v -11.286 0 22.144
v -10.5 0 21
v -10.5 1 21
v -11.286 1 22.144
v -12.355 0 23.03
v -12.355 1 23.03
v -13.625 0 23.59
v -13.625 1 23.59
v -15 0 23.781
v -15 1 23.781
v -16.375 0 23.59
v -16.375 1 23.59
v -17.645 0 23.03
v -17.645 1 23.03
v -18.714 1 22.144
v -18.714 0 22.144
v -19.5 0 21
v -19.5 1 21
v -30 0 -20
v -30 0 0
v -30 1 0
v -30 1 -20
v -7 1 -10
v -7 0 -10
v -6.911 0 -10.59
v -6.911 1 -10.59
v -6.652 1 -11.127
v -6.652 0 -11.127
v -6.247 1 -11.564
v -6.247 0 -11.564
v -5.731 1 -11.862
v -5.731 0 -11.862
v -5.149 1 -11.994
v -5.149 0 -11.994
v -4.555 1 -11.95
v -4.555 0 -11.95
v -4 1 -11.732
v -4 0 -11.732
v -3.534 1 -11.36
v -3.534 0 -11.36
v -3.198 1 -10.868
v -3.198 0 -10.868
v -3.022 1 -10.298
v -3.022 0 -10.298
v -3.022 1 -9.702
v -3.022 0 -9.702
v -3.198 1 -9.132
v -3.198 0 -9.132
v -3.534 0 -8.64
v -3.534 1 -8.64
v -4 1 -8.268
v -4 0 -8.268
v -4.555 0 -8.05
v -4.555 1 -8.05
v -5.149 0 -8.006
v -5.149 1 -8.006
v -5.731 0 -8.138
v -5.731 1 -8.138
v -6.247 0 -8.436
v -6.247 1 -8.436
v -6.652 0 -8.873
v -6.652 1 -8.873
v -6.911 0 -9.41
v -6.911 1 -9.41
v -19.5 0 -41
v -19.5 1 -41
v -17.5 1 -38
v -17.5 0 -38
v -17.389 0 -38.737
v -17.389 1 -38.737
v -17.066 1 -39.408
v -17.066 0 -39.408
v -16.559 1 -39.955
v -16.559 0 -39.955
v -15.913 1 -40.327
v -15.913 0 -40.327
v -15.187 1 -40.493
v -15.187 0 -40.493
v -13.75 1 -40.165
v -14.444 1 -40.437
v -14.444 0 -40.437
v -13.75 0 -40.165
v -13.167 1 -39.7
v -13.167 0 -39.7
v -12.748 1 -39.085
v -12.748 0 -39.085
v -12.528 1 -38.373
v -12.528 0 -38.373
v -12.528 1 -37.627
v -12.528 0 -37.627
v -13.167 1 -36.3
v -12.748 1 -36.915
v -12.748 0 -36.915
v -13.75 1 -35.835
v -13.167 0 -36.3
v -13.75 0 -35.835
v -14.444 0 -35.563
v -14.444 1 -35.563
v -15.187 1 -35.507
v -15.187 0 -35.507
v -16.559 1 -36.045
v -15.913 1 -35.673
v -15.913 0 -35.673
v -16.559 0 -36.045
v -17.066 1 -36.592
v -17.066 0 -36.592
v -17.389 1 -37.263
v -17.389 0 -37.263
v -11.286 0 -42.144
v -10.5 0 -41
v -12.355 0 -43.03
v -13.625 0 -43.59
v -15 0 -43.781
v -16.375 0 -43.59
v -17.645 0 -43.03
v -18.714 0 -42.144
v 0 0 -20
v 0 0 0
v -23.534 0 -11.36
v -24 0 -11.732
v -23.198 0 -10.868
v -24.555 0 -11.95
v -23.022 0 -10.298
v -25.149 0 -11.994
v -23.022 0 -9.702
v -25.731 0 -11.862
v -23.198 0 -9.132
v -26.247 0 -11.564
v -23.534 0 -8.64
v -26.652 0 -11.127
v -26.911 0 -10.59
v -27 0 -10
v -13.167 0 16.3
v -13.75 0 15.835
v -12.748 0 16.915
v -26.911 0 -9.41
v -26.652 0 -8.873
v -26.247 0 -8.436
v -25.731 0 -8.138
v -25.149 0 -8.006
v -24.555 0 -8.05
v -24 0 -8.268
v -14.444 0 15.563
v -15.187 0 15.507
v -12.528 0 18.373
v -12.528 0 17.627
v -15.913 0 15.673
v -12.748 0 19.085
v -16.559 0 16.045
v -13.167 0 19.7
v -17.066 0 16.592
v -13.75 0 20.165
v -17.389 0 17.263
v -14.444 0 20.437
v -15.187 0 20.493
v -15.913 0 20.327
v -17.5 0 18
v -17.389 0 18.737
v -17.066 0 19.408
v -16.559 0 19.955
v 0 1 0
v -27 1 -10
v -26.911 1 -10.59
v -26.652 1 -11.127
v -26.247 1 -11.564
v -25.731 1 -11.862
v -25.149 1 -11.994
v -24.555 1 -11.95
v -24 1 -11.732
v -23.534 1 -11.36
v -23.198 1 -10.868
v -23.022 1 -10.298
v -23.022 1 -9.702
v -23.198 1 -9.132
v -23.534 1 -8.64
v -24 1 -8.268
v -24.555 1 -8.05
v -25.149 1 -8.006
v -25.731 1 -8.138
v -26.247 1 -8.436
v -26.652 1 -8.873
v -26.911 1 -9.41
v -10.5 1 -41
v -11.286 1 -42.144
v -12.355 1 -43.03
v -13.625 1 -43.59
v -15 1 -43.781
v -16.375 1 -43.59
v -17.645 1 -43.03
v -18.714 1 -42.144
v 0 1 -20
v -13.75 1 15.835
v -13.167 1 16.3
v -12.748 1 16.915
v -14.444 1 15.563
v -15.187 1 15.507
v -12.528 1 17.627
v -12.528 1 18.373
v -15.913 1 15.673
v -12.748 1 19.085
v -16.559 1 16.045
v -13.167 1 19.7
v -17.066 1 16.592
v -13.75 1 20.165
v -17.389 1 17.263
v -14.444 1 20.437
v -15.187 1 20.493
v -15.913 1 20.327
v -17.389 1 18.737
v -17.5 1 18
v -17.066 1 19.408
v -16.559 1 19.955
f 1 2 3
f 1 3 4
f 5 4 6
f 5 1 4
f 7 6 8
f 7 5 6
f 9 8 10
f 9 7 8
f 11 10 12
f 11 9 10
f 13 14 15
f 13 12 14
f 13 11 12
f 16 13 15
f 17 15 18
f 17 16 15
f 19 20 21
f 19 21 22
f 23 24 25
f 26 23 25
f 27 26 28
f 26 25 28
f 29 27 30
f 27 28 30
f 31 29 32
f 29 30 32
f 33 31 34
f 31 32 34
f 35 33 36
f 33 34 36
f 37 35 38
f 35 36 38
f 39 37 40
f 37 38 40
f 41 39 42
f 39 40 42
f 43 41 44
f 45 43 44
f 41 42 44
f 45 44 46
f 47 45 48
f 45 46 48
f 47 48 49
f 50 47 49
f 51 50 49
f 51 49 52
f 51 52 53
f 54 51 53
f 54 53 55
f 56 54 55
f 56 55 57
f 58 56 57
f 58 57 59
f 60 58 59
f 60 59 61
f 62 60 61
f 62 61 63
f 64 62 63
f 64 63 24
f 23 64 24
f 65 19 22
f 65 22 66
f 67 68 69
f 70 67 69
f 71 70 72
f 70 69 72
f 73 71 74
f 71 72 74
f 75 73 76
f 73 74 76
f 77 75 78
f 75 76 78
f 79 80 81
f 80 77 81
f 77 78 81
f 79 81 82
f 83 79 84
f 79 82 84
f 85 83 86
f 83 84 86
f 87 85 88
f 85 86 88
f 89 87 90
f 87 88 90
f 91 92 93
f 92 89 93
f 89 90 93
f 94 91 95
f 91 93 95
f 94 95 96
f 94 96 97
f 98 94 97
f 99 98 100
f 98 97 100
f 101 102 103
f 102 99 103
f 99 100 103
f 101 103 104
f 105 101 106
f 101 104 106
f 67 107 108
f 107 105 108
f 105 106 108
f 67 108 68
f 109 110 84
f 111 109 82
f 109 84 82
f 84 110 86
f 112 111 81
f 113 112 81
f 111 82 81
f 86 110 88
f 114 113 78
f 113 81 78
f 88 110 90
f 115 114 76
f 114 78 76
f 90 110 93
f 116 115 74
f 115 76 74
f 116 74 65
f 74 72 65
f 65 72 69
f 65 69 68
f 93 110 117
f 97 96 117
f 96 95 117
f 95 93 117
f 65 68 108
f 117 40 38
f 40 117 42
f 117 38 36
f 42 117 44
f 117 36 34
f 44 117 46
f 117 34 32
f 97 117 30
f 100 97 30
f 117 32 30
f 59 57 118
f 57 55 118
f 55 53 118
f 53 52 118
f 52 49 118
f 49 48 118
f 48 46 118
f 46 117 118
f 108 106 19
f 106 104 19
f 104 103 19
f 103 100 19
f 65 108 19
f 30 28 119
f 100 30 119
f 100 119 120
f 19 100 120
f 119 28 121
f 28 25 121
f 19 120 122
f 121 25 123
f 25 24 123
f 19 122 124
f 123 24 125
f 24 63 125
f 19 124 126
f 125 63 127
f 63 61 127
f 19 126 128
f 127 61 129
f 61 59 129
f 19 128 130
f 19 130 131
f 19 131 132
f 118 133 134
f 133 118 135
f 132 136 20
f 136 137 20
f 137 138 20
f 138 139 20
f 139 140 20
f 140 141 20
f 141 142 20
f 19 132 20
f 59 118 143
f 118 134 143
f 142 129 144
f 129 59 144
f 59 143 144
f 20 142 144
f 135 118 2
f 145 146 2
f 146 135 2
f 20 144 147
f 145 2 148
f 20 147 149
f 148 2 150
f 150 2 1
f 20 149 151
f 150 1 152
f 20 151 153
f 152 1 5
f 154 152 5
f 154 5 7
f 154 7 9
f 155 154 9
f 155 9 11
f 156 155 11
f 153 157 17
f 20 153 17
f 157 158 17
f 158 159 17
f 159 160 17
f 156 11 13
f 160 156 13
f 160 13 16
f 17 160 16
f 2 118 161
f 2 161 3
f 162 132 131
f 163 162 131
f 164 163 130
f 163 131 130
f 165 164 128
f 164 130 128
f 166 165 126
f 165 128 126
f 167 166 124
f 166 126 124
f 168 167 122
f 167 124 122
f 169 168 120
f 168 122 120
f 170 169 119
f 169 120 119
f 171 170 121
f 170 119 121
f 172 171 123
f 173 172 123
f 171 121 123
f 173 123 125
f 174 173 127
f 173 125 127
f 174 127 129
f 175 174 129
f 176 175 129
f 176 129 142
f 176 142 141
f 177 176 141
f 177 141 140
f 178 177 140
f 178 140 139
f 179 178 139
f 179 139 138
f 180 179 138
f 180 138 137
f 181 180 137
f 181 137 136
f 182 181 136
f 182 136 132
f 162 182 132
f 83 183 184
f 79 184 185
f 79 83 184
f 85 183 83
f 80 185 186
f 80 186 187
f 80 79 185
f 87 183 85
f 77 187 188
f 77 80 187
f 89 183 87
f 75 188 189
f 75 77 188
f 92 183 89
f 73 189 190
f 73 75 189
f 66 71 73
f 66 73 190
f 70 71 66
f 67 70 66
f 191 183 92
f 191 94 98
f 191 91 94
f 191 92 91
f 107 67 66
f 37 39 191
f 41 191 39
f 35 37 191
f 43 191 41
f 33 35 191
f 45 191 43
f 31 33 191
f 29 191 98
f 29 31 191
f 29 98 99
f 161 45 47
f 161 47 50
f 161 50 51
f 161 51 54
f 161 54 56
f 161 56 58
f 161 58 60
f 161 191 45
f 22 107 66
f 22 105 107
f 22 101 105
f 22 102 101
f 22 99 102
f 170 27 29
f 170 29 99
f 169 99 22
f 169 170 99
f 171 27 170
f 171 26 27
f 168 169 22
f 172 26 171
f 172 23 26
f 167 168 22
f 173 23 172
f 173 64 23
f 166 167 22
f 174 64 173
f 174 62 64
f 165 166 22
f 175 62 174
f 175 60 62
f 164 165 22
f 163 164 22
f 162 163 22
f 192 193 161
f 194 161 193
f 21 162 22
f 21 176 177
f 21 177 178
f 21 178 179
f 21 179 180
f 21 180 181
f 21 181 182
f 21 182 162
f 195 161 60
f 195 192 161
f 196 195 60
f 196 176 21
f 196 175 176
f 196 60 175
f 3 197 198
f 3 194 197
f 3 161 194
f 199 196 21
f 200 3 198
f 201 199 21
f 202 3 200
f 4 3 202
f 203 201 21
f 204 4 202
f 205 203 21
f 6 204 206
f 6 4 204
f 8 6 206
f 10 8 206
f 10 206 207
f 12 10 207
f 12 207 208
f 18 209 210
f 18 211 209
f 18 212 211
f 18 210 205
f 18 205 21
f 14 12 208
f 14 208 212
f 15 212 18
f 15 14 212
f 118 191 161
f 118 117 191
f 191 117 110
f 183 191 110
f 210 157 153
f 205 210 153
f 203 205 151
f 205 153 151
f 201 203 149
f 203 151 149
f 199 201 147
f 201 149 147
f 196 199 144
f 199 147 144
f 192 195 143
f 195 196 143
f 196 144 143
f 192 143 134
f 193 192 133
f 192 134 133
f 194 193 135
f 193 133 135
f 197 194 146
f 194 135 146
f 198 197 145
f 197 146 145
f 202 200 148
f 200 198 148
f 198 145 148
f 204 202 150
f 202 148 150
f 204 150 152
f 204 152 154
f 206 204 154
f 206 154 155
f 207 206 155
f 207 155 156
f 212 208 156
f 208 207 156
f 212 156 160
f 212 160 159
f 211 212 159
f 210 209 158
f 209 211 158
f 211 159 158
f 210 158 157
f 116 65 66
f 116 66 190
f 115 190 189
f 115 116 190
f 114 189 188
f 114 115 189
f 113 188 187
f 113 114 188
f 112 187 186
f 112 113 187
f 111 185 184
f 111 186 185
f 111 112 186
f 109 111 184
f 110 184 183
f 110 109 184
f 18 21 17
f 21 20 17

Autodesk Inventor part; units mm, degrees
ref_plane "YZ Plane" through (0, 0, 0) normal (1, 0, 0) x (0, 1, 0)
ref_plane "XZ Plane" through (0, 0, 0) normal (0, 1, 0) x (-1, 0, 0)
ref_plane "XY Plane" through (0, 0, 0) normal (0, 0, 1) x (1, 0, 0)
sketch "Sketch1" plane through (0, 0, 0) normal (0, 1, 0) x (-1, 0, 0)
  line L0 (0, 0) -> (30, 0)
  line L1 (30, 0) -> (30, -20)
  line L2 (30, -20) -> (0, -20)
  line L3 (0, -20) -> (0, 0)
  line L4 (30, -10) -> (0, -10)
  line L5 (15, 0) -> (15, -20)
  circle A0 centre (25, -10) radius 2
  circle A1 centre (15, -38) radius 2.5
  line L6 (30, -20) -> (19.5, -41)
  circle A2 centre (5, -10) radius 2
  line L7 (0, -20) -> (10.5, -41)
  arc A3 (10.5, -41) -> (19.5, -41) centre (15, -38.75) ccw
  line L8 (30, 0) -> (0, 0)
  circle A4 centre (15, 18) radius 2.5
  line L9 (30, 0) -> (19.5, 21)
  line L10 (0, 0) -> (10.5, 21)
  arc A5 (19.5, 21) -> (10.5, 21) centre (15, 18.75) ccw
  dimension "d0" = 20
  dimension "d1" = 30
  dimension "d2" = 5
  dimension "d3" = 4
  dimension "d5" = 18
  dimension "d6" = 5
  dimension "d7" = 21
  dimension "d8" = 10.5
extrude "Extrusion1" add sketch "Sketch1" along normal blind 1 contours L10 A5 L9 L0 | L0 L5 L4 A2 L3 | L0 L1 L4 A0 L5 | L4 A2 L5 L2 L3 | L4 A0 L1 L2 L5 | L2 L6 A3 L7
properties part number "Platte2"
